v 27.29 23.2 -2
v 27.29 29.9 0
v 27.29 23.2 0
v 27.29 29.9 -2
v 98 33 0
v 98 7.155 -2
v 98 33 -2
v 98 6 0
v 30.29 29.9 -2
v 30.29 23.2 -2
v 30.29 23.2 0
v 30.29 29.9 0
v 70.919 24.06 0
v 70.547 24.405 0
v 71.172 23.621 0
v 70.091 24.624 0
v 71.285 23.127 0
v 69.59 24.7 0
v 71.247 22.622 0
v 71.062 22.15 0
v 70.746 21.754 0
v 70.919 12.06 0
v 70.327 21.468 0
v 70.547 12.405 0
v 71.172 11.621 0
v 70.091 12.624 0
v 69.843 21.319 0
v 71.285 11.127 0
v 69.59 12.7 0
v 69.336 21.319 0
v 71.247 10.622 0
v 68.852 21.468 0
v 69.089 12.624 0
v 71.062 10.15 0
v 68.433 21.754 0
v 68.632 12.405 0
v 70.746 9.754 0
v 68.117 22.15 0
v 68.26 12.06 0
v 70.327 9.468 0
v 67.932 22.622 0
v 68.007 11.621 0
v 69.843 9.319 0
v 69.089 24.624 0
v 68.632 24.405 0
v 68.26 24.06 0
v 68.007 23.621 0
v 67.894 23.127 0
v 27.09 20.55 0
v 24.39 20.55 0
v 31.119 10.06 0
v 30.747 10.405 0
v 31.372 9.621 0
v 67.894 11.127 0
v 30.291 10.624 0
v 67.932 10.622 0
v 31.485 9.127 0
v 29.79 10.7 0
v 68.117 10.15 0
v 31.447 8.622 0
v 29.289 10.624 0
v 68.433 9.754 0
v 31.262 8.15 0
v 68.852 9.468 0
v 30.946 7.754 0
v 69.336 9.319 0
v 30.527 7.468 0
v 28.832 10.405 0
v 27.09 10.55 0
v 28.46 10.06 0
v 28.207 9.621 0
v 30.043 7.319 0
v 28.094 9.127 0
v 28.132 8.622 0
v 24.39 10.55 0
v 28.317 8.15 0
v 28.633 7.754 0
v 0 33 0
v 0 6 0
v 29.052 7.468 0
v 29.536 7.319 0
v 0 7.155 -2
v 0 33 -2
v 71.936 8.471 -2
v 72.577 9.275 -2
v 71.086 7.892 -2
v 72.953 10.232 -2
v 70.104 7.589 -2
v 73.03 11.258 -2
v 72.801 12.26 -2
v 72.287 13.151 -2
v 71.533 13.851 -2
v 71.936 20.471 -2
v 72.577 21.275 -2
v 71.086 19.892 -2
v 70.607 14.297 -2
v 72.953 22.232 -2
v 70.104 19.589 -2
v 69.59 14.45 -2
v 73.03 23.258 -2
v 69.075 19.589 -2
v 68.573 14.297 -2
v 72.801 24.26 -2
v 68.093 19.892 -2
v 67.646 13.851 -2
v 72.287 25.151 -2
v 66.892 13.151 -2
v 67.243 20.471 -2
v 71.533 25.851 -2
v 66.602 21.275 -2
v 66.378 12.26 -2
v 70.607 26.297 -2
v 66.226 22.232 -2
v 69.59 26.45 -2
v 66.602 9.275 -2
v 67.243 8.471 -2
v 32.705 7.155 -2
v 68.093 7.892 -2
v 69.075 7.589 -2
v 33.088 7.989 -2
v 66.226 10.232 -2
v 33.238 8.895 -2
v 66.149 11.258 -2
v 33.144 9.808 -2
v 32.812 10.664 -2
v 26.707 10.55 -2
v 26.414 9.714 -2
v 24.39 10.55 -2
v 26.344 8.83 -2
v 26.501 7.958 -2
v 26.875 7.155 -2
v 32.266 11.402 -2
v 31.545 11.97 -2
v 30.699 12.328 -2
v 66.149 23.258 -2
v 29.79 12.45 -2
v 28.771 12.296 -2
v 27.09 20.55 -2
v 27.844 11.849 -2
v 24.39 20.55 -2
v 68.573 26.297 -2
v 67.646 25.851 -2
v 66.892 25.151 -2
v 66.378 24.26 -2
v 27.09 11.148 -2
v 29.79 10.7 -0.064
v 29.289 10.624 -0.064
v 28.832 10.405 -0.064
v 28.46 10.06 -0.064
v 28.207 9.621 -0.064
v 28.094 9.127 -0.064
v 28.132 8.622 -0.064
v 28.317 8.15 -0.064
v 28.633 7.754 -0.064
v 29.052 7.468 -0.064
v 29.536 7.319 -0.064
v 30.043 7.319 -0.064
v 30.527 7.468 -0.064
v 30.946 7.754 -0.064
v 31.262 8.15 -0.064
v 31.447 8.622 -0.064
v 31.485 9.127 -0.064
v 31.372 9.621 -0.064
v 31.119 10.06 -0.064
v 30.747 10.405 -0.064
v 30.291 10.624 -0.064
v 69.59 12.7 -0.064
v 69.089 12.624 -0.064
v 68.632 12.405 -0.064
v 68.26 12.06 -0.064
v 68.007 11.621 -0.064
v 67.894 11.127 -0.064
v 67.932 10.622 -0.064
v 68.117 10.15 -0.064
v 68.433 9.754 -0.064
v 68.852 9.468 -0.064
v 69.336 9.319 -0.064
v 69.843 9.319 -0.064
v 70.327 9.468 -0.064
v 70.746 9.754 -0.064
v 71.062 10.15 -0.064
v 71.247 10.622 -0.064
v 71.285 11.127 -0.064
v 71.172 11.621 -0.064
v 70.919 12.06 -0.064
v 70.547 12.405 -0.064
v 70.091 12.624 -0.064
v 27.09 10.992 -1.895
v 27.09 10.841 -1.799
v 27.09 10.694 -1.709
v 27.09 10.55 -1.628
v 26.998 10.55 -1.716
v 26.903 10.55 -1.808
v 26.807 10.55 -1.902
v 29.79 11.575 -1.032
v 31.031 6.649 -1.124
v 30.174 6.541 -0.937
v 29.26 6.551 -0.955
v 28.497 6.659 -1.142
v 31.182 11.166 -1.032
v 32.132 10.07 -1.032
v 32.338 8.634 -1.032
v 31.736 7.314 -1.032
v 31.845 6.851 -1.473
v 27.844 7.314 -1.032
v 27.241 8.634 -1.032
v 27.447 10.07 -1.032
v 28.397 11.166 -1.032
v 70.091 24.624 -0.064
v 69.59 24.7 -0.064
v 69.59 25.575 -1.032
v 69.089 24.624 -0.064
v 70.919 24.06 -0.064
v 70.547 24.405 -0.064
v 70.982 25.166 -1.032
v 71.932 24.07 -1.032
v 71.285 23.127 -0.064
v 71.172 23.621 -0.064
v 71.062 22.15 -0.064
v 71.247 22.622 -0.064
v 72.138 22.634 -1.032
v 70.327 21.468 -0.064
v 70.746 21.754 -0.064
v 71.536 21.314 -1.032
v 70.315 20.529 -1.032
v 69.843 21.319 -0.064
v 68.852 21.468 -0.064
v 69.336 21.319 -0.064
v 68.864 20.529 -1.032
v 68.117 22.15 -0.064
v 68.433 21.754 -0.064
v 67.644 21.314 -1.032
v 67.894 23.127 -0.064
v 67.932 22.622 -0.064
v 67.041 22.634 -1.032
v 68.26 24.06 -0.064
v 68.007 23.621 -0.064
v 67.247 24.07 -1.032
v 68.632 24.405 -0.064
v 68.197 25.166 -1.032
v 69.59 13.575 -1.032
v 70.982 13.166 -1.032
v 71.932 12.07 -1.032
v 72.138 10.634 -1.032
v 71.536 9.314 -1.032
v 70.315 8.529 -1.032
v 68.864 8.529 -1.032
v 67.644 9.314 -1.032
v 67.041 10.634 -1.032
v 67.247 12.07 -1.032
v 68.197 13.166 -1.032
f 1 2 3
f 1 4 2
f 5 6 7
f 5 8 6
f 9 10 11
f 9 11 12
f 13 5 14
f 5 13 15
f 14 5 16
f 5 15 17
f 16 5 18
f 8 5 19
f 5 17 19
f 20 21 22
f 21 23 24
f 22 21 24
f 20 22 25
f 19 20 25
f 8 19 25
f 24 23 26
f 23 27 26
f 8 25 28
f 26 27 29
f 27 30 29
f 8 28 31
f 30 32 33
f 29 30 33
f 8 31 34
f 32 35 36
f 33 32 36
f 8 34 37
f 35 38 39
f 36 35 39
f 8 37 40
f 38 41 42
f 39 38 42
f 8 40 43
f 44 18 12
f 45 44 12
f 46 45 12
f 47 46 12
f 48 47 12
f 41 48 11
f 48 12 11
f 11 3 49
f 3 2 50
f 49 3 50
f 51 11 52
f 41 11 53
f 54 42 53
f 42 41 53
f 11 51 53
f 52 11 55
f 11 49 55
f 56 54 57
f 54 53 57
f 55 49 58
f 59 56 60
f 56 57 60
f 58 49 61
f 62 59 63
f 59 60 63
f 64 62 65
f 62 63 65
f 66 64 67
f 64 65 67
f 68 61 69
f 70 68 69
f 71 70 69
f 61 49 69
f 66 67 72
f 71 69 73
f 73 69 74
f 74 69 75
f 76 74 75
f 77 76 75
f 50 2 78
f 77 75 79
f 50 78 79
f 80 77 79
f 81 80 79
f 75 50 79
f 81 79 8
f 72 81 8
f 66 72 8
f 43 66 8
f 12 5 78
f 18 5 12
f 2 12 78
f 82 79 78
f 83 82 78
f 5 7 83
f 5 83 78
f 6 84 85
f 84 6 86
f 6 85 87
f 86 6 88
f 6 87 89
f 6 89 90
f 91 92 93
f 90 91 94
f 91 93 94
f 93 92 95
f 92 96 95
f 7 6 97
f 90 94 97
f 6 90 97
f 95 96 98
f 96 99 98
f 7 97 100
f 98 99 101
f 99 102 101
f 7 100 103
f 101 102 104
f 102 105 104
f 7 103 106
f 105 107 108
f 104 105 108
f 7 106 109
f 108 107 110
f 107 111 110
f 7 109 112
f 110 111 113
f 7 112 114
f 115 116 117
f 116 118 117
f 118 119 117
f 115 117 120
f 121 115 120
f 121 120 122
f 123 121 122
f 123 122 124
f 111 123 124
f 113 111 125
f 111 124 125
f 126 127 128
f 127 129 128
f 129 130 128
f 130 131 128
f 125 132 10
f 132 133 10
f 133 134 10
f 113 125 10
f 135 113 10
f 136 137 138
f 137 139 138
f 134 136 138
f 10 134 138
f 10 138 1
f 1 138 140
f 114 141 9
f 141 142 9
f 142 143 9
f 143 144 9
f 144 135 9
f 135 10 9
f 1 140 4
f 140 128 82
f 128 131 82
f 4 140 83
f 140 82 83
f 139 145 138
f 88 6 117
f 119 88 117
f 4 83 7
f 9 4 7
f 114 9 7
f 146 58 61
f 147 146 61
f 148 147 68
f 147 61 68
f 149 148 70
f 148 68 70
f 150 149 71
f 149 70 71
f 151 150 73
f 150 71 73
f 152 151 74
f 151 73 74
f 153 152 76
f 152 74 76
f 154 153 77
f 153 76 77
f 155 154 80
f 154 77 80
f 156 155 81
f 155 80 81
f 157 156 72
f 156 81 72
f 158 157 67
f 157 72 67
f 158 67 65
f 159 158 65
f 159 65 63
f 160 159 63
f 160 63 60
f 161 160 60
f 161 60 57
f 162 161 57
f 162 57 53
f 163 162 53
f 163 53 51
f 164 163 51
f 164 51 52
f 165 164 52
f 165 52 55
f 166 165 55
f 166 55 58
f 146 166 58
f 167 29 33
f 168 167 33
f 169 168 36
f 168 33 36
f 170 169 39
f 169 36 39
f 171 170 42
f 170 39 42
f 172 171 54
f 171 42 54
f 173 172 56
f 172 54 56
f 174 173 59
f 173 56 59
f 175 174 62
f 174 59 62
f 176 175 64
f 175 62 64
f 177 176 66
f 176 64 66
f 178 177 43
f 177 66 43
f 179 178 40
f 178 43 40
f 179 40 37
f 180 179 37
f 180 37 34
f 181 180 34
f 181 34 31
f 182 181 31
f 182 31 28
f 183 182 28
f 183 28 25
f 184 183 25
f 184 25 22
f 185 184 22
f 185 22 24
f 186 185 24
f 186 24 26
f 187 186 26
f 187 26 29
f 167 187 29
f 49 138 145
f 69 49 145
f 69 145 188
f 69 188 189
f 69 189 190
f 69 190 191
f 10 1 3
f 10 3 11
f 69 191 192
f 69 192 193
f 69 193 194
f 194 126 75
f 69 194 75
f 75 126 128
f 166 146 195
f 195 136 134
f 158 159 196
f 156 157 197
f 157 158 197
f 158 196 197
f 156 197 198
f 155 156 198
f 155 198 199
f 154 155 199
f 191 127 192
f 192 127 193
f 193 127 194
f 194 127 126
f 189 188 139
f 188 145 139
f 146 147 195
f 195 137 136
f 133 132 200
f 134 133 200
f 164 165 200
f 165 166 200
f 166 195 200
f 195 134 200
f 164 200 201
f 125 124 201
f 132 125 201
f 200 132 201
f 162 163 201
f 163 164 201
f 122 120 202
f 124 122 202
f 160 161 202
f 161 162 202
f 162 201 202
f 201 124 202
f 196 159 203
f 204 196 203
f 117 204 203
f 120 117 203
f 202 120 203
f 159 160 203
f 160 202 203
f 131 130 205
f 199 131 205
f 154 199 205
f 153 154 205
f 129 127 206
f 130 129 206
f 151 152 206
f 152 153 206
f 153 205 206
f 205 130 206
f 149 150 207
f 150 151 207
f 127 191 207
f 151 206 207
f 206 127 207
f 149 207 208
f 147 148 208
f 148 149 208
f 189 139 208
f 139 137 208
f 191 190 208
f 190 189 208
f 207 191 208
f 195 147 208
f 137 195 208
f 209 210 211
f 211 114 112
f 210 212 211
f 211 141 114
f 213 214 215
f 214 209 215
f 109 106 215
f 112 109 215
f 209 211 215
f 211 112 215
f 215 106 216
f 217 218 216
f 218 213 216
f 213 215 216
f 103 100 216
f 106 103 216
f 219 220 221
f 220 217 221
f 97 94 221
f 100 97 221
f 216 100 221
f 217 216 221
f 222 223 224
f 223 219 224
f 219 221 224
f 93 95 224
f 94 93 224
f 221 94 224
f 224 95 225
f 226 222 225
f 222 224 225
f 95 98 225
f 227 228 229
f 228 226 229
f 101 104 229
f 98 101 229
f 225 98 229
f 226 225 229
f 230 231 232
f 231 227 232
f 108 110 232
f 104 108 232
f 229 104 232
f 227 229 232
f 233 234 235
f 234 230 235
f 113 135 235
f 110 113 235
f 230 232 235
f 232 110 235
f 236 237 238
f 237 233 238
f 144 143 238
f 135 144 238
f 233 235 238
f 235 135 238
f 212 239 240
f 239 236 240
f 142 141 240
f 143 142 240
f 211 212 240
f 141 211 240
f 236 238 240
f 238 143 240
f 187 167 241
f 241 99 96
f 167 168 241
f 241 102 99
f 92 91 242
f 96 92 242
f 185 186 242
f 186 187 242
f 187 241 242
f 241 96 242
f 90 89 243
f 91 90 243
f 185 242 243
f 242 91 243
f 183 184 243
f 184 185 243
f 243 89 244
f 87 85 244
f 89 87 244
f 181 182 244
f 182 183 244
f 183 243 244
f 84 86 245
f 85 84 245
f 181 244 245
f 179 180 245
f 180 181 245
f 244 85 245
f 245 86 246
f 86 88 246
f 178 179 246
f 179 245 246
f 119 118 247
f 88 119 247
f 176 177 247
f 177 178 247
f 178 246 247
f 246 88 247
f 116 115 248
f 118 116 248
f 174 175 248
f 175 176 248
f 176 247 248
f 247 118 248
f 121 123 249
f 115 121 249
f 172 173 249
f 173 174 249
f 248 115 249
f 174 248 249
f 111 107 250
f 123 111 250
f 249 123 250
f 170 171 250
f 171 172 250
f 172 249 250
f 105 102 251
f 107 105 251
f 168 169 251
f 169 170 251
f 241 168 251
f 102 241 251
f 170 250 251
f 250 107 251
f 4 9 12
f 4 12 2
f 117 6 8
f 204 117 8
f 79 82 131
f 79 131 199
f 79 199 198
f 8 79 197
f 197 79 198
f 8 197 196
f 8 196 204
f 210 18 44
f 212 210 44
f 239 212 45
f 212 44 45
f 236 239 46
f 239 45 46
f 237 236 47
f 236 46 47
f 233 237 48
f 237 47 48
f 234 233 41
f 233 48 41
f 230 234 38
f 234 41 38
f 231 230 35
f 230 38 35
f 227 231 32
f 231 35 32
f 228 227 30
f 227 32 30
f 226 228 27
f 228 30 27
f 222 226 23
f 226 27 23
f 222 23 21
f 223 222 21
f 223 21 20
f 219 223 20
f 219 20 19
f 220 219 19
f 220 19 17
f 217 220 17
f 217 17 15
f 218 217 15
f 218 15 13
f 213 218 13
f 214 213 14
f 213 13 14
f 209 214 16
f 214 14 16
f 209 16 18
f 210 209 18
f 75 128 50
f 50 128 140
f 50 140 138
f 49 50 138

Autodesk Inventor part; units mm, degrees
ref_plane "YZ Plane" through (0, 0, 0) normal (1, 0, 0) x (0, 1, 0)
ref_plane "XZ Plane" through (0, 0, 0) normal (0, 1, 0) x (-1, 0, 0)
ref_plane "XY Plane" through (0, 0, 0) normal (0, 0, 1) x (1, 0, 0)
sketch "Szkic1" plane through (0, 0, 0) normal (1, 0, 0) x (0, 1, 0)
  line L0 (6, 0) -> (6, -2)
  line L1 (6, -2) -> (33, -2)
  line L2 (33, -2) -> (33, 0)
  line L3 (33, 0) -> (6, 0)
  line L4 (31, 0) -> (31, 2.3) construction
  line L5 (6, 0) -> (31, 0) construction
  line L6 (6, 5) -> (6, 0) construction
  dimension "d1" = 2
  dimension "d27" = 2
extrude "Wyciągnięcie proste1" add sketch "Szkic1" along normal blind 98
sketch "Szkic2" plane through (0, 6, -2) normal (0, 0, -1) x (-1, 0, 0)
  circle A0 centre (-69.5896, 17) radius 1.2295 construction
  circle A1 centre (-69.5896, 5) radius 1.2295 construction
  circle A2 centre (-29.7896, 3) radius 1.2295 construction
hole "Otwór1" at (69.5896, 23, -2) at (69.5896, 11, -2) at (29.7896, 9, -2) direction (0, 0, 1) diameter 3.4 depth 5.5 tip angle 118 countersink diameter 6.9 countersink angle 84.225 clearance for "Śruba ze łbem stożkowym ISO 2009/7046" size "M3" standard "ISO"
sketch "Szkic3" plane through (0, 6, -2) normal (0, 0, -1) x (-1, 0, 0)
  line L0 (-32.2896, 0) -> (-32.2896, 25) projected
  line L1 (-27.0896, 4.55) -> (-24.3896, 4.55)
  line L2 (-24.3896, 4.55) -> (-24.3896, 14.55)
  line L3 (-24.3896, 14.55) -> (-27.0896, 14.55)
  line L4 (-27.0896, 14.55) -> (-27.0896, 4.55)
  line L5 (-30.2896, 23.9) -> (-27.2896, 23.9)
  line L6 (-27.2896, 23.9) -> (-27.2896, 17.2)
  line L7 (-27.2896, 17.2) -> (-30.2896, 17.2)
  line L8 (-30.2896, 17.2) -> (-30.2896, 23.9)
  point P0 (0, -6)
  dimension "d17" = 5.2
  dimension "d18" = 4.55
  dimension "d19" = 2.7
  dimension "d20" = 10
  dimension "d21" = 2
  dimension "d22" = 17.2
  dimension "d23" = 6.7
  dimension "d24" = 3
extrude "Wyciągnięcie proste2" cut sketch "Szkic3" against normal up to next
sketch "Sketch4" plane through (0, 0, 0) normal (-1, 0, 0) x (0, 0, 1)
  line L0 (-2, 6) -> (-2, 33) construction
  line L1 (-2, 6) -> (-2, 7.1547)
  line L2 (0, 6) -> (-2, 6)
  line L3 (-2, 7.1547) -> (0, 6)
  point P0 (0, 0)
  dimension "d31" = 30
extrude "Extrusion3" cut sketch "Sketch4" against normal through all
properties part number "Tyl" material "Aluminium 6061"
